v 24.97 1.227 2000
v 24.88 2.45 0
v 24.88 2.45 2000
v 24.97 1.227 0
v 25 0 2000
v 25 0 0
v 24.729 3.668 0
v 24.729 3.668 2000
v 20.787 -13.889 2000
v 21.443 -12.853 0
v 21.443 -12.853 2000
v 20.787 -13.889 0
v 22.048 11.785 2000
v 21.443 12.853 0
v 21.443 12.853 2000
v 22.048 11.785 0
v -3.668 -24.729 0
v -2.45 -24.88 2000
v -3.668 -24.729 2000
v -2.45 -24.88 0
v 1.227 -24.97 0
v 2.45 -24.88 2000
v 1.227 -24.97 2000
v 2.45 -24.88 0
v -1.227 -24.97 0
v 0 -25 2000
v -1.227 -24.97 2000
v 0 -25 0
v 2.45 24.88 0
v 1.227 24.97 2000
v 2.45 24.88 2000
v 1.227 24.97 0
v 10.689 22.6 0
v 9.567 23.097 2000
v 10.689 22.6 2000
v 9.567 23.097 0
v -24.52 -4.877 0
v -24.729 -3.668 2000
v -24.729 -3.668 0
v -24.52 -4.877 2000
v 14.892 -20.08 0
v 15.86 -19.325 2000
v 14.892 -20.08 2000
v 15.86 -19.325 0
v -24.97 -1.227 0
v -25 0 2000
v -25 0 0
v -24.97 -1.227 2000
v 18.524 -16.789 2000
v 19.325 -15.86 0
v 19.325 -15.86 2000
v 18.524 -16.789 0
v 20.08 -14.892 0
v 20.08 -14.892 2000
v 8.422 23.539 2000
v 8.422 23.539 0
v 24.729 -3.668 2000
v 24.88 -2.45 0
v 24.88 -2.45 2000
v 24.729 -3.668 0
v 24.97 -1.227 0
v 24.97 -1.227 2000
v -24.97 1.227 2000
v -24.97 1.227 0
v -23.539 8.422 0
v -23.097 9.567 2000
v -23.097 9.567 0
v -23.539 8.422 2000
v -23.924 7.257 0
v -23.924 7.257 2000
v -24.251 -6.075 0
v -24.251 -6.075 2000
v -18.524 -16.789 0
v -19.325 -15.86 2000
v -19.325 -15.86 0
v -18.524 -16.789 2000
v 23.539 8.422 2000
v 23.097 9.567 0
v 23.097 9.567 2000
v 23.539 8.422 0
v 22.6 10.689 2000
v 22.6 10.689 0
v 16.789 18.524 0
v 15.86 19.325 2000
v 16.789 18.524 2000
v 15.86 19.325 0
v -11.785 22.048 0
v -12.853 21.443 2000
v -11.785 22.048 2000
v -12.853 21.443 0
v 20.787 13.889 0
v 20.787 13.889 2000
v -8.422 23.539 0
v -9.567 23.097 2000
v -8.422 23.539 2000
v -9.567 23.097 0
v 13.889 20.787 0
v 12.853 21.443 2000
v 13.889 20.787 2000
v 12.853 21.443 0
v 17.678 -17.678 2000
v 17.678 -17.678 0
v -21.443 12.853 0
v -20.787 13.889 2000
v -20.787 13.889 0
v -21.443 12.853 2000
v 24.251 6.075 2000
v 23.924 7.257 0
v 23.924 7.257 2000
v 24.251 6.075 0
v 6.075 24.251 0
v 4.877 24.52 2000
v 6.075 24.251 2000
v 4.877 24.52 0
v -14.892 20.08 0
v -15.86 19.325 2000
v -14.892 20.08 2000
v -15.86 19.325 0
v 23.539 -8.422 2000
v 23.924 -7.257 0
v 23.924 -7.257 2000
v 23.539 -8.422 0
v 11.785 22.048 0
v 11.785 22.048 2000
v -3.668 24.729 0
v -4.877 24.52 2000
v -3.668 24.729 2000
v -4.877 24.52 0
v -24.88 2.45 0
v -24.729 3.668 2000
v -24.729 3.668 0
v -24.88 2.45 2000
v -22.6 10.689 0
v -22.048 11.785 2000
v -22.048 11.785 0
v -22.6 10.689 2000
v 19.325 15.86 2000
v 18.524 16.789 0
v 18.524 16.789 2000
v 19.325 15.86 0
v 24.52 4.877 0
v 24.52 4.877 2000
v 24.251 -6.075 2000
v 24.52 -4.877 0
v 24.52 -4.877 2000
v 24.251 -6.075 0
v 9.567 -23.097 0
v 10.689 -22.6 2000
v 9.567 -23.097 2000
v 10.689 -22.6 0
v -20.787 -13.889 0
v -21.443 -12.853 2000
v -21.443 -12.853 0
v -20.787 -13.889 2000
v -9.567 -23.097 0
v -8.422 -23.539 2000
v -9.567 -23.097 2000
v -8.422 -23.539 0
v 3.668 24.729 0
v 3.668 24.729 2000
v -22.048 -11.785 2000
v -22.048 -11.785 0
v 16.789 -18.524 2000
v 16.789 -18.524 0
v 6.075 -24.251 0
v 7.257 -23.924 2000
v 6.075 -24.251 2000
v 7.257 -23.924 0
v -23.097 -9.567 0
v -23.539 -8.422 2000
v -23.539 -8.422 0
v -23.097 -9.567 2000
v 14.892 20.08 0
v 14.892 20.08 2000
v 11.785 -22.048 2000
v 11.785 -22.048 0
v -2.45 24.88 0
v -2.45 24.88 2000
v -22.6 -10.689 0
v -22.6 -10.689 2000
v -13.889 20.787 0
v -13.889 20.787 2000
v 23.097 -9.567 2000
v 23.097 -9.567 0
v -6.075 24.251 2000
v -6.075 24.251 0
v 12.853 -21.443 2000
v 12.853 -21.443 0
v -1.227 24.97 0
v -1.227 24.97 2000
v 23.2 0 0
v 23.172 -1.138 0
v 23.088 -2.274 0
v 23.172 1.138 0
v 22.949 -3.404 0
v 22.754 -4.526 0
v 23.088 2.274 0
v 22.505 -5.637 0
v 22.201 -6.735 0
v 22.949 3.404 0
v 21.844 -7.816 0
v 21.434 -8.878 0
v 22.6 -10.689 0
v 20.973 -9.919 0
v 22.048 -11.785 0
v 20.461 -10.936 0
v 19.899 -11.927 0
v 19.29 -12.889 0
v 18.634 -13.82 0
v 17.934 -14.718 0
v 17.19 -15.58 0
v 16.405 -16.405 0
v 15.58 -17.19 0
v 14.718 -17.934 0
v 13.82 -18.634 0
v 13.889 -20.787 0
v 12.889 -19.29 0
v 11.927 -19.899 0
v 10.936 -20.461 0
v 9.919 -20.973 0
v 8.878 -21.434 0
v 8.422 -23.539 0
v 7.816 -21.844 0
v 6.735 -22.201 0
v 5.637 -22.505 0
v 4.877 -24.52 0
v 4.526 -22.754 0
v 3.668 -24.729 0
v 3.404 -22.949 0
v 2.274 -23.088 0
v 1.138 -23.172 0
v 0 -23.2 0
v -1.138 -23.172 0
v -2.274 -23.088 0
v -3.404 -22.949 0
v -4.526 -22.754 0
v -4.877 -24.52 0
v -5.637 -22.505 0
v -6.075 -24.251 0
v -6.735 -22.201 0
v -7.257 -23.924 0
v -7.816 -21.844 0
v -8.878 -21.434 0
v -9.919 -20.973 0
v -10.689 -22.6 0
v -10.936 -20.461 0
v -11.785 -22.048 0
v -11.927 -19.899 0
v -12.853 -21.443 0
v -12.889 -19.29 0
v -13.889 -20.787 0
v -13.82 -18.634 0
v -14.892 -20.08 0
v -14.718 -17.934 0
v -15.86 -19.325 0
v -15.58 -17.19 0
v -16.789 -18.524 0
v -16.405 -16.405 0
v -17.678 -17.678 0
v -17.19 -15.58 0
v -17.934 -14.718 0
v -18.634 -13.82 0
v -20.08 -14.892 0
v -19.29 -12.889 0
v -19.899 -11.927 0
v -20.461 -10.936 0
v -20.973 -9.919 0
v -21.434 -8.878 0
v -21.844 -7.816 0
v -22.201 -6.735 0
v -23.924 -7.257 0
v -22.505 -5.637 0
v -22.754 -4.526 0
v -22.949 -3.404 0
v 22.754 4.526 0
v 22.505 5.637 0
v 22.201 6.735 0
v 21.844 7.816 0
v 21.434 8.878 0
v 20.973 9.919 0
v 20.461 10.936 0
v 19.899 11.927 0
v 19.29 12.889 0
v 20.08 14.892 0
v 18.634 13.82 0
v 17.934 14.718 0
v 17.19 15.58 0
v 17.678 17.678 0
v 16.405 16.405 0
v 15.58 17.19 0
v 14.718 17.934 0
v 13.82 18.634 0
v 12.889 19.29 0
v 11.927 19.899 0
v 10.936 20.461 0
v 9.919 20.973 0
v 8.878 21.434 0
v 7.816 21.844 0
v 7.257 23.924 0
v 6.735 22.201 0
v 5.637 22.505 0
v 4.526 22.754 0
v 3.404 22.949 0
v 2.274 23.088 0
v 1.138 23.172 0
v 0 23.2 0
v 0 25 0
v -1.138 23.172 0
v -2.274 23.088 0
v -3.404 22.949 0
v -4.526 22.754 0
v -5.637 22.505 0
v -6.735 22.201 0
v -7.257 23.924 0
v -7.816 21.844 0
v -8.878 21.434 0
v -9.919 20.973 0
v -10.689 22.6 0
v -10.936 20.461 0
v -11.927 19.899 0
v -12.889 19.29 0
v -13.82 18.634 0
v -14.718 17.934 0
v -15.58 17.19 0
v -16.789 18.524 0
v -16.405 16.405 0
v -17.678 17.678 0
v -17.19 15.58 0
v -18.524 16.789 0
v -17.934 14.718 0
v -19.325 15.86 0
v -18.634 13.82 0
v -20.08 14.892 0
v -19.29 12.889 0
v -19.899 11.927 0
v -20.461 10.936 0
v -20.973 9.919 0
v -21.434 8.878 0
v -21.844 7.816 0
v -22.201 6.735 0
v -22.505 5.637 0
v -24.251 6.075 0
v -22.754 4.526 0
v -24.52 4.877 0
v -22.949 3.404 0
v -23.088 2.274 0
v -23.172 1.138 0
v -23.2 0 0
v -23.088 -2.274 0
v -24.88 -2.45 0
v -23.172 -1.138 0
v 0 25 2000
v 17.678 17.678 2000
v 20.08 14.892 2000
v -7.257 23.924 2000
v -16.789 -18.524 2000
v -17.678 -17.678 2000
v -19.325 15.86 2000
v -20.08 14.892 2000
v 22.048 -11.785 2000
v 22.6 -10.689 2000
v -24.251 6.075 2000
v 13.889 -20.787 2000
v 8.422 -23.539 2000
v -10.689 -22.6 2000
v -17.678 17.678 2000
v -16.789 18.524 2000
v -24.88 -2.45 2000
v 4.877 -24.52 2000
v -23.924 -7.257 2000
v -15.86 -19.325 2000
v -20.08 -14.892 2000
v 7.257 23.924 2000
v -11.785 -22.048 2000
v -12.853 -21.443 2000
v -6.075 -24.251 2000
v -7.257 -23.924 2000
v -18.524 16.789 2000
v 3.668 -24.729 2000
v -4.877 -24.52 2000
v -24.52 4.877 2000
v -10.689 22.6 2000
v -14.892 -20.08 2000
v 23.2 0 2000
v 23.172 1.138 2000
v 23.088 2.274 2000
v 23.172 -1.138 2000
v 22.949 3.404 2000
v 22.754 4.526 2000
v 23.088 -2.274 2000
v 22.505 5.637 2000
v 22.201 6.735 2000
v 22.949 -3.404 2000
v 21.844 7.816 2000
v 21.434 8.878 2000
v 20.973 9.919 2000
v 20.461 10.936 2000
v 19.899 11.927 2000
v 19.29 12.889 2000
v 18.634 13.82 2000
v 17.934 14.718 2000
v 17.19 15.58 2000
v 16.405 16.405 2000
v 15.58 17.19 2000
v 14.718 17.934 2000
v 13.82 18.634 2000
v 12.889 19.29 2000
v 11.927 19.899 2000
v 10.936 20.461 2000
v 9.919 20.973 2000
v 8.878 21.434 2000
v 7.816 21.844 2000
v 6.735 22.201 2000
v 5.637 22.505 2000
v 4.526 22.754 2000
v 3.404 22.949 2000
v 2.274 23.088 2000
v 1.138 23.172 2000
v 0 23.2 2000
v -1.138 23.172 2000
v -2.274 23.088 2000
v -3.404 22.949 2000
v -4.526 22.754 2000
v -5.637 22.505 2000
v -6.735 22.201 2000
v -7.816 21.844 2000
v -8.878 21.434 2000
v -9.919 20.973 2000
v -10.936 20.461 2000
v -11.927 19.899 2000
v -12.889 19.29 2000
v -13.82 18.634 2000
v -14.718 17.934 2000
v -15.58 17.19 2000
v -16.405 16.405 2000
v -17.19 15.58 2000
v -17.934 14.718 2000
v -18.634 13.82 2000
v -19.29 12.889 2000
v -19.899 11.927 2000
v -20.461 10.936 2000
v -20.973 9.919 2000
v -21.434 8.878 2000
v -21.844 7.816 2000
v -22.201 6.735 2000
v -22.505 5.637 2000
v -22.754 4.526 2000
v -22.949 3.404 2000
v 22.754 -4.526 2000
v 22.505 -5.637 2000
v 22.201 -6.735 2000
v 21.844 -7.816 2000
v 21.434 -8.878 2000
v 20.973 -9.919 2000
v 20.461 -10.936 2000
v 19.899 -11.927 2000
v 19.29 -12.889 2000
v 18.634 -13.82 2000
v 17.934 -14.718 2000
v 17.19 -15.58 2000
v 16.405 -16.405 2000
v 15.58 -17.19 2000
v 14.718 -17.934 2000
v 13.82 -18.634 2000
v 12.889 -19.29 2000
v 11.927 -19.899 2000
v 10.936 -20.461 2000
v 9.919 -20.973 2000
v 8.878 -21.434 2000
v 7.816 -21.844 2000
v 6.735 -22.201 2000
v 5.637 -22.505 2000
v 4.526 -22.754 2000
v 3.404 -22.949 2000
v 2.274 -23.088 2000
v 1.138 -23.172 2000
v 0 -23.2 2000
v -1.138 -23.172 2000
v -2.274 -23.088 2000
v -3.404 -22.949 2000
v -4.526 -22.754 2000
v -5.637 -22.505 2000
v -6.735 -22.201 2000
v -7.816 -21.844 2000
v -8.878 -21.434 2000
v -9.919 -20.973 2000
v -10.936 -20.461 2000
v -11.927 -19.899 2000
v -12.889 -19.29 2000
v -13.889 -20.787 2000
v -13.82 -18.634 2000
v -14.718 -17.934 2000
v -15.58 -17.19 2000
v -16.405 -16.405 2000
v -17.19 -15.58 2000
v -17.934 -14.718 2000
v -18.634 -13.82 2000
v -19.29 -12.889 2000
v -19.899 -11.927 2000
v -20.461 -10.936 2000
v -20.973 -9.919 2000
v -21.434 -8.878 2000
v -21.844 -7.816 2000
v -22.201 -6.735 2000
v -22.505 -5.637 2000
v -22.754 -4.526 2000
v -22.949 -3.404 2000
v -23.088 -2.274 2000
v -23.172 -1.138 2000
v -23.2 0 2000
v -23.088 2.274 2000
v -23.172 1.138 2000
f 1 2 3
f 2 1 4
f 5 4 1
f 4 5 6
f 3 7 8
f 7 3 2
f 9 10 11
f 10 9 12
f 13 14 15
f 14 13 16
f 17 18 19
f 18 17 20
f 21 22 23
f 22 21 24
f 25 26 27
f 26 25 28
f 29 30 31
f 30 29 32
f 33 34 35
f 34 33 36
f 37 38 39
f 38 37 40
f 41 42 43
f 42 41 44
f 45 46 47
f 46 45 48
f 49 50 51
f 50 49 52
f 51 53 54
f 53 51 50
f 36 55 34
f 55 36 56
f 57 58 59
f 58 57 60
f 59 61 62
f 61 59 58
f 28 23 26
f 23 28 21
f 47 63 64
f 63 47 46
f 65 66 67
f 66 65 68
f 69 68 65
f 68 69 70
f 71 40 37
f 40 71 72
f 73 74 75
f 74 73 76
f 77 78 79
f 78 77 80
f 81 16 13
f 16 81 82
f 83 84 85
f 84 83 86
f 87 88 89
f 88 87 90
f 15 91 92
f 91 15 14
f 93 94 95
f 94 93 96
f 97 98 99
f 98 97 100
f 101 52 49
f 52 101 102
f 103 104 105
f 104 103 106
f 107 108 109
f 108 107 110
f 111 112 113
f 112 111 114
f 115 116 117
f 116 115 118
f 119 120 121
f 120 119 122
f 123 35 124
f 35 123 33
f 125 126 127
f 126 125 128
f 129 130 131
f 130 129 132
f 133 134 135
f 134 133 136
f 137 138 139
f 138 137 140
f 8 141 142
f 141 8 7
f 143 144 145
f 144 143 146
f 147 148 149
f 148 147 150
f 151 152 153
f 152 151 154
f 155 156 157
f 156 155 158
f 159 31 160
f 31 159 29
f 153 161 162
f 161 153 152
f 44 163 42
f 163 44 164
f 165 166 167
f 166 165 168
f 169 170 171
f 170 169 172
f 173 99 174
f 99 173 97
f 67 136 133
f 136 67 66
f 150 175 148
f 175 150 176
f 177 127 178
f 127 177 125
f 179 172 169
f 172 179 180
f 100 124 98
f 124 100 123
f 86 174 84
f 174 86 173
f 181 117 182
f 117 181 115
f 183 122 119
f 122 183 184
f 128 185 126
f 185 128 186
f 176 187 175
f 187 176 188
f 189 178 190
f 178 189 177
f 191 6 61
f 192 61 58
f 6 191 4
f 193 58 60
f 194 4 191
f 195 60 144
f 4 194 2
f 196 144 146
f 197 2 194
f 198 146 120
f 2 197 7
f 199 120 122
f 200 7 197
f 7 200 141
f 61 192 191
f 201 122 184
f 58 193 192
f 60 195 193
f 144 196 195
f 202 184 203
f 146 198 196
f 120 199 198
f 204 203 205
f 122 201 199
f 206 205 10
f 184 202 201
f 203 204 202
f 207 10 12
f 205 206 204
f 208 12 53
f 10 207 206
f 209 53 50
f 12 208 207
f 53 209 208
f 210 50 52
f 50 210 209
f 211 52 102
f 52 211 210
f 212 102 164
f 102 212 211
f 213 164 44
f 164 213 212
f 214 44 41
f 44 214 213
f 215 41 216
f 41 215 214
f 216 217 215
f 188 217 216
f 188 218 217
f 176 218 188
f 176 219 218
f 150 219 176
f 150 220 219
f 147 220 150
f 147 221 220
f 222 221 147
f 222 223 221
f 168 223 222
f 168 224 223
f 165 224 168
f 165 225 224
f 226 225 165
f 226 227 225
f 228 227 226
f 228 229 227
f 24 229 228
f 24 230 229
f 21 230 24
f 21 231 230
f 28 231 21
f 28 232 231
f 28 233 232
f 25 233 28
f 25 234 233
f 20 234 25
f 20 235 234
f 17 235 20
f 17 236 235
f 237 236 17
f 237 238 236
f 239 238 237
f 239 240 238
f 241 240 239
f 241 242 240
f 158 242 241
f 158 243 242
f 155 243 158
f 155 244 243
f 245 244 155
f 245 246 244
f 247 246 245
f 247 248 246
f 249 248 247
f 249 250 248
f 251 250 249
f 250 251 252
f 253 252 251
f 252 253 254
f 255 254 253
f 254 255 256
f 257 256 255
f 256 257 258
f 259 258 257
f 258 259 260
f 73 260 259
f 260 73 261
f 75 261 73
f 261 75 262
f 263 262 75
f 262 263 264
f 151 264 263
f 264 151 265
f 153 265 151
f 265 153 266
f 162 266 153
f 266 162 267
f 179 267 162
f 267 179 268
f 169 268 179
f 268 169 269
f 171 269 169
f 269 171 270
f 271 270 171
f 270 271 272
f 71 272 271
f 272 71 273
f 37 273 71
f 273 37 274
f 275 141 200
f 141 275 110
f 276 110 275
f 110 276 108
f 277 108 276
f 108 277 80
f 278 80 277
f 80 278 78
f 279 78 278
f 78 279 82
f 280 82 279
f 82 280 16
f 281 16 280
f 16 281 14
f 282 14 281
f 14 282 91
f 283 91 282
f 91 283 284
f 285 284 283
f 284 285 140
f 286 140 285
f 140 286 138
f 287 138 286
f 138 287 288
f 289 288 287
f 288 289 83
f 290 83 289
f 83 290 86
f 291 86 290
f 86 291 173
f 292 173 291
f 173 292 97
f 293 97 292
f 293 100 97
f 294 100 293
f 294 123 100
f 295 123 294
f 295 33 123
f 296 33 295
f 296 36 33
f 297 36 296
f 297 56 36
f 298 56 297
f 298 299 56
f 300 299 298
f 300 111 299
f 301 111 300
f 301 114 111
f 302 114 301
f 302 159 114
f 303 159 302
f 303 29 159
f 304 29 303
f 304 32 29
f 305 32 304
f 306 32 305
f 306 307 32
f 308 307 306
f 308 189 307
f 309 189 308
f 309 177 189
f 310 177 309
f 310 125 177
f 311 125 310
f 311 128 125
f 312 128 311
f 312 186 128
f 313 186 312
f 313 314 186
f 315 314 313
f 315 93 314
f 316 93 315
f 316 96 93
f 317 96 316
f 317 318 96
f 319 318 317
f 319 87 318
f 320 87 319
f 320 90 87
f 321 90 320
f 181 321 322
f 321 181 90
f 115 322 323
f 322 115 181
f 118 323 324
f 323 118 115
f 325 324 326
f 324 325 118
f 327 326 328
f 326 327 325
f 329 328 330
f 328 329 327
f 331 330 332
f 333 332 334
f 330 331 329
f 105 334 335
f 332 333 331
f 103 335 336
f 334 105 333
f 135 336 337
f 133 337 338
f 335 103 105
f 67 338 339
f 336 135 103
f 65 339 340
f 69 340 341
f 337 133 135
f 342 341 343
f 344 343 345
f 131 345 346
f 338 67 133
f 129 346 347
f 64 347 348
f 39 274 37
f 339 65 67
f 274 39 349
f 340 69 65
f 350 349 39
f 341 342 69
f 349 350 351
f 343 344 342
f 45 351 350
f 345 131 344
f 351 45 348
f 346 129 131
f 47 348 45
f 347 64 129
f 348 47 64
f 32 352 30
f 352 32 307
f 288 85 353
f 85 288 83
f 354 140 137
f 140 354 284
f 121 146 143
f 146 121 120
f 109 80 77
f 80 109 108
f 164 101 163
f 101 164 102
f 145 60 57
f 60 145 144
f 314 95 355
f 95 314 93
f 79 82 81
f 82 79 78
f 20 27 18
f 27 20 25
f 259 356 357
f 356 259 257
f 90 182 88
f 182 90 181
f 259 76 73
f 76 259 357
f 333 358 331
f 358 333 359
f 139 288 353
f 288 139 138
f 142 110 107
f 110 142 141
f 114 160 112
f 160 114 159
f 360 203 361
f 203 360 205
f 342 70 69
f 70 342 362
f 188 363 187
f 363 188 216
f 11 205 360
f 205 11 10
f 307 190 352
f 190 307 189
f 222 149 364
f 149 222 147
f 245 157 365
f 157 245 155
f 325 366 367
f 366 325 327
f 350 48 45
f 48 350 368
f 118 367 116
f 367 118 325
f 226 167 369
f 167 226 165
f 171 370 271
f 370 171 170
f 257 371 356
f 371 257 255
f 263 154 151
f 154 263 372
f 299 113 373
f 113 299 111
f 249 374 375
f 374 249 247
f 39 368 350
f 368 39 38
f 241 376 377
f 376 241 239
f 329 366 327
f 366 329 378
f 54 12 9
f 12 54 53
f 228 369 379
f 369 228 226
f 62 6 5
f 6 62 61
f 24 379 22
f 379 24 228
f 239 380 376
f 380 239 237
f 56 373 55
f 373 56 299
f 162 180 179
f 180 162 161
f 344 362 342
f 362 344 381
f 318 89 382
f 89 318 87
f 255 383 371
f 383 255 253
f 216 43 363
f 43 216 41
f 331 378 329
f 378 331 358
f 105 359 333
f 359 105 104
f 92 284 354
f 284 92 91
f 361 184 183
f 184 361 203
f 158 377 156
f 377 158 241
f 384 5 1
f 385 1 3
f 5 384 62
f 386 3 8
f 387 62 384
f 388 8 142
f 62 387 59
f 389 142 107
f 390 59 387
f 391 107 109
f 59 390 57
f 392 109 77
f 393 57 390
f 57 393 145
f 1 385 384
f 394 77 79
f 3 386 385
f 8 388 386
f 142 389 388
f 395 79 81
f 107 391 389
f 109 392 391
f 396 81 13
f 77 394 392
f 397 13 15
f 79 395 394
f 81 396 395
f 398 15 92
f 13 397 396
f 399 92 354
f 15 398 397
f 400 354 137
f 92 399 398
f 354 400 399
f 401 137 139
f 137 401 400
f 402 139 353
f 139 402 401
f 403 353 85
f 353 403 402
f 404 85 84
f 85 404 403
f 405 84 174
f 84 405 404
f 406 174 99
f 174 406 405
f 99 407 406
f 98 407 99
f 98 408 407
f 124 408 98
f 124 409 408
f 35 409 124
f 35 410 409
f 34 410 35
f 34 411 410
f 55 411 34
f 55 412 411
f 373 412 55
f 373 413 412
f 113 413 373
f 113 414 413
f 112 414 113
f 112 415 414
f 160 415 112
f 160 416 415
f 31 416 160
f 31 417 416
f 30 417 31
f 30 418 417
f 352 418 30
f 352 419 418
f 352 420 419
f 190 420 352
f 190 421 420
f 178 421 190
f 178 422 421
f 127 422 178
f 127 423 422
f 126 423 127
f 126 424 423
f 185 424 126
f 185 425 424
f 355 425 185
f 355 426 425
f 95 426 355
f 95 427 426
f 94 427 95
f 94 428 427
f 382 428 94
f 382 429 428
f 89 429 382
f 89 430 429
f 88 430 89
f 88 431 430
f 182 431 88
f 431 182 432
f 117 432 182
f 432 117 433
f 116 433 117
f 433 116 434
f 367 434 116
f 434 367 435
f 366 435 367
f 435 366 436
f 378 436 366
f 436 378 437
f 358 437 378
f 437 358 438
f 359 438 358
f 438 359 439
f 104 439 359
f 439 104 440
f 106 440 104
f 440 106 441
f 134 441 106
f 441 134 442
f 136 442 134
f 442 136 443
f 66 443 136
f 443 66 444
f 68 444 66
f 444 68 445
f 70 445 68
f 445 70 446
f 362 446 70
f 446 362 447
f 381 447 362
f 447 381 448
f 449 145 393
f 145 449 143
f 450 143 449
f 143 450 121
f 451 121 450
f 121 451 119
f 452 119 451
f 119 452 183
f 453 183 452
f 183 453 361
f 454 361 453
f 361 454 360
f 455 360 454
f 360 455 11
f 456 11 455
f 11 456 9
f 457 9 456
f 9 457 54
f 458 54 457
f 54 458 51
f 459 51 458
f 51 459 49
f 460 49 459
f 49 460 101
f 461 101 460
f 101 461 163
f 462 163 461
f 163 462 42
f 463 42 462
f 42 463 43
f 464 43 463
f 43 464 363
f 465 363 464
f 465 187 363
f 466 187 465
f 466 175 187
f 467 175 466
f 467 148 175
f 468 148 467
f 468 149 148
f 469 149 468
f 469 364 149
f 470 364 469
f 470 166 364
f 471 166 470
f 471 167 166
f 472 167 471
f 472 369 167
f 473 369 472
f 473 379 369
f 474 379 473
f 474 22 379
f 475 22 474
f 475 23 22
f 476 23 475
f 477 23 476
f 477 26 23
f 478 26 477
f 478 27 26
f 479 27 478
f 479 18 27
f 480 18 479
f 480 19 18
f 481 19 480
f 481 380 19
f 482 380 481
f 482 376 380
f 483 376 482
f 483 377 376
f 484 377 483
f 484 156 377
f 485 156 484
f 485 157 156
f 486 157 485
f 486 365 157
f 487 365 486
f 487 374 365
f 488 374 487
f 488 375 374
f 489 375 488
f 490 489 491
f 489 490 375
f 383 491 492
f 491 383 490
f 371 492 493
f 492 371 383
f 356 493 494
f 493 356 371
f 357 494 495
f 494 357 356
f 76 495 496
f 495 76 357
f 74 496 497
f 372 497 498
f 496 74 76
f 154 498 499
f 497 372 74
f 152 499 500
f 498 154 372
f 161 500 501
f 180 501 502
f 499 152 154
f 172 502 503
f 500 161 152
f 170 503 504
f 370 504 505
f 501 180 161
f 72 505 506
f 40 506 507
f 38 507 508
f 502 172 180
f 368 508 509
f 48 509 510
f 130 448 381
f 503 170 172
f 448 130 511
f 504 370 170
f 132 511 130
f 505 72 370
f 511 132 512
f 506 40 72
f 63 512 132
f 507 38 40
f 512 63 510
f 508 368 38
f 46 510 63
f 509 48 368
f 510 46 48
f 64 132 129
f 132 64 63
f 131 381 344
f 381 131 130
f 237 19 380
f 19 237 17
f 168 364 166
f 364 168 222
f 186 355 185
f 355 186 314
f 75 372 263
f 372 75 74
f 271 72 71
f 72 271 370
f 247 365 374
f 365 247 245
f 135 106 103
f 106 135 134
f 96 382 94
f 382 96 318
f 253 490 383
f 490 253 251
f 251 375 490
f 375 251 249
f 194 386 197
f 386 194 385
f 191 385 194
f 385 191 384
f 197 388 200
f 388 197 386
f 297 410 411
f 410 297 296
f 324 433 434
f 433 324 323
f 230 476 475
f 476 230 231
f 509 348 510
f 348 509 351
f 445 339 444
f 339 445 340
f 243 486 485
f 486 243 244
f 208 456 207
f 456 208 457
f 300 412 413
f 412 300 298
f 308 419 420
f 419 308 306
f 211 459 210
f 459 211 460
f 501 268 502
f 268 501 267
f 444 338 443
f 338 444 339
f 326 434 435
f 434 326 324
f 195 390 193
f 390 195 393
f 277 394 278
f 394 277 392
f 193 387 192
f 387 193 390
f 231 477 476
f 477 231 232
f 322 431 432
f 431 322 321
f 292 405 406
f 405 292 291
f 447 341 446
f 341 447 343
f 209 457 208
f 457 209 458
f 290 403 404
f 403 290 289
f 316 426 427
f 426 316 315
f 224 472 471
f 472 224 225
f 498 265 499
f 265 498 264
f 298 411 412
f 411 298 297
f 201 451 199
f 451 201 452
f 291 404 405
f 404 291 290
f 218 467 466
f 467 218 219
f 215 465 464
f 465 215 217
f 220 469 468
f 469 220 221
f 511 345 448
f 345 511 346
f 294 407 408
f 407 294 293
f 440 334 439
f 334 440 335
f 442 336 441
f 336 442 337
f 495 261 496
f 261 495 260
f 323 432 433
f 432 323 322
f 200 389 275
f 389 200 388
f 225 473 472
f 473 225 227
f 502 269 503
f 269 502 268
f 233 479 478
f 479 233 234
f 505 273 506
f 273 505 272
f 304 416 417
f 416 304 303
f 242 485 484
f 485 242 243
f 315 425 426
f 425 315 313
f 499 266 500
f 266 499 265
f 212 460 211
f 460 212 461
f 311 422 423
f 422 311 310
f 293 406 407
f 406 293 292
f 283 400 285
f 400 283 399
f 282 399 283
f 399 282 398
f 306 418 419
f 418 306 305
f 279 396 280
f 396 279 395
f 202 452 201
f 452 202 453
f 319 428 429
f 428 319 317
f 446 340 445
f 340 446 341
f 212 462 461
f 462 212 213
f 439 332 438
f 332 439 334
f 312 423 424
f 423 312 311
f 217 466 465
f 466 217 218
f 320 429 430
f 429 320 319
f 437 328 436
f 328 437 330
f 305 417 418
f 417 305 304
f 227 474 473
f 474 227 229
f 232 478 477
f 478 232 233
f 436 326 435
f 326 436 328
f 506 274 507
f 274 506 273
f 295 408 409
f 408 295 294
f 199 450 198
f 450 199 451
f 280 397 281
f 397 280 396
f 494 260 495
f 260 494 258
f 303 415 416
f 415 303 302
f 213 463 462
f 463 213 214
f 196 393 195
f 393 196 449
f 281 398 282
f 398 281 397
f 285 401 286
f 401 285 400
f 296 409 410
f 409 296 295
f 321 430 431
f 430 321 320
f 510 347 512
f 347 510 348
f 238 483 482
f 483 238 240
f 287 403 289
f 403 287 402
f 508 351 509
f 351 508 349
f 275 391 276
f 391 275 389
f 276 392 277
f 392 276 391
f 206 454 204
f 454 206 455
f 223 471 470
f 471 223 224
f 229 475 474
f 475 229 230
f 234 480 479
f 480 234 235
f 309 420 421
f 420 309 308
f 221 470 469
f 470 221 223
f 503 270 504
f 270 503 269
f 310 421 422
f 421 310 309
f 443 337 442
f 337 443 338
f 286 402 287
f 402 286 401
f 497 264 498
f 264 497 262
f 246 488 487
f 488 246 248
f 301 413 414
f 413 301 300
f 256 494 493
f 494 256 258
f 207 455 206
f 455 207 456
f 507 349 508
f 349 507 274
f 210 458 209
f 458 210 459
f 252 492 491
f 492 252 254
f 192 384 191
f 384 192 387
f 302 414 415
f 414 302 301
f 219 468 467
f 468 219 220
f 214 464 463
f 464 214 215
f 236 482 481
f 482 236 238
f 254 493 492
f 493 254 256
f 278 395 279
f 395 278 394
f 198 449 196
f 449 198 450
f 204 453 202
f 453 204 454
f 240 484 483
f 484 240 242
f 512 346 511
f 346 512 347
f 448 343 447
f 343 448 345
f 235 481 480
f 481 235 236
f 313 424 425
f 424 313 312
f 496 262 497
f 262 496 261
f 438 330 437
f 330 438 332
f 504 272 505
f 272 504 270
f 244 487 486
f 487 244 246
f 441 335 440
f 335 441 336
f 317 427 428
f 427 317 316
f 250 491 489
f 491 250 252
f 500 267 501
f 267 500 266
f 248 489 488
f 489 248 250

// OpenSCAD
$fn = 128;

// HT 50 pipe (approx): DN 50, length 2000 mm
// Typical HT (PP) dimensions vary by manufacturer; using common approximations:
// Outer diameter ~ 50 mm, wall thickness ~ 1.8 mm.
pipe_length = 2000;
outer_d = 50;
wall = 1.8;
inner_d = outer_d - 2*wall;

module ht_pipe(len=pipe_length, od=outer_d, id=inner_d) {
    difference() {
        cylinder(h=len, d=od, center=false);
        translate([0,0,-0.5])
            cylinder(h=len+1, d=id, center=false);
    }
}

ht_pipe();
